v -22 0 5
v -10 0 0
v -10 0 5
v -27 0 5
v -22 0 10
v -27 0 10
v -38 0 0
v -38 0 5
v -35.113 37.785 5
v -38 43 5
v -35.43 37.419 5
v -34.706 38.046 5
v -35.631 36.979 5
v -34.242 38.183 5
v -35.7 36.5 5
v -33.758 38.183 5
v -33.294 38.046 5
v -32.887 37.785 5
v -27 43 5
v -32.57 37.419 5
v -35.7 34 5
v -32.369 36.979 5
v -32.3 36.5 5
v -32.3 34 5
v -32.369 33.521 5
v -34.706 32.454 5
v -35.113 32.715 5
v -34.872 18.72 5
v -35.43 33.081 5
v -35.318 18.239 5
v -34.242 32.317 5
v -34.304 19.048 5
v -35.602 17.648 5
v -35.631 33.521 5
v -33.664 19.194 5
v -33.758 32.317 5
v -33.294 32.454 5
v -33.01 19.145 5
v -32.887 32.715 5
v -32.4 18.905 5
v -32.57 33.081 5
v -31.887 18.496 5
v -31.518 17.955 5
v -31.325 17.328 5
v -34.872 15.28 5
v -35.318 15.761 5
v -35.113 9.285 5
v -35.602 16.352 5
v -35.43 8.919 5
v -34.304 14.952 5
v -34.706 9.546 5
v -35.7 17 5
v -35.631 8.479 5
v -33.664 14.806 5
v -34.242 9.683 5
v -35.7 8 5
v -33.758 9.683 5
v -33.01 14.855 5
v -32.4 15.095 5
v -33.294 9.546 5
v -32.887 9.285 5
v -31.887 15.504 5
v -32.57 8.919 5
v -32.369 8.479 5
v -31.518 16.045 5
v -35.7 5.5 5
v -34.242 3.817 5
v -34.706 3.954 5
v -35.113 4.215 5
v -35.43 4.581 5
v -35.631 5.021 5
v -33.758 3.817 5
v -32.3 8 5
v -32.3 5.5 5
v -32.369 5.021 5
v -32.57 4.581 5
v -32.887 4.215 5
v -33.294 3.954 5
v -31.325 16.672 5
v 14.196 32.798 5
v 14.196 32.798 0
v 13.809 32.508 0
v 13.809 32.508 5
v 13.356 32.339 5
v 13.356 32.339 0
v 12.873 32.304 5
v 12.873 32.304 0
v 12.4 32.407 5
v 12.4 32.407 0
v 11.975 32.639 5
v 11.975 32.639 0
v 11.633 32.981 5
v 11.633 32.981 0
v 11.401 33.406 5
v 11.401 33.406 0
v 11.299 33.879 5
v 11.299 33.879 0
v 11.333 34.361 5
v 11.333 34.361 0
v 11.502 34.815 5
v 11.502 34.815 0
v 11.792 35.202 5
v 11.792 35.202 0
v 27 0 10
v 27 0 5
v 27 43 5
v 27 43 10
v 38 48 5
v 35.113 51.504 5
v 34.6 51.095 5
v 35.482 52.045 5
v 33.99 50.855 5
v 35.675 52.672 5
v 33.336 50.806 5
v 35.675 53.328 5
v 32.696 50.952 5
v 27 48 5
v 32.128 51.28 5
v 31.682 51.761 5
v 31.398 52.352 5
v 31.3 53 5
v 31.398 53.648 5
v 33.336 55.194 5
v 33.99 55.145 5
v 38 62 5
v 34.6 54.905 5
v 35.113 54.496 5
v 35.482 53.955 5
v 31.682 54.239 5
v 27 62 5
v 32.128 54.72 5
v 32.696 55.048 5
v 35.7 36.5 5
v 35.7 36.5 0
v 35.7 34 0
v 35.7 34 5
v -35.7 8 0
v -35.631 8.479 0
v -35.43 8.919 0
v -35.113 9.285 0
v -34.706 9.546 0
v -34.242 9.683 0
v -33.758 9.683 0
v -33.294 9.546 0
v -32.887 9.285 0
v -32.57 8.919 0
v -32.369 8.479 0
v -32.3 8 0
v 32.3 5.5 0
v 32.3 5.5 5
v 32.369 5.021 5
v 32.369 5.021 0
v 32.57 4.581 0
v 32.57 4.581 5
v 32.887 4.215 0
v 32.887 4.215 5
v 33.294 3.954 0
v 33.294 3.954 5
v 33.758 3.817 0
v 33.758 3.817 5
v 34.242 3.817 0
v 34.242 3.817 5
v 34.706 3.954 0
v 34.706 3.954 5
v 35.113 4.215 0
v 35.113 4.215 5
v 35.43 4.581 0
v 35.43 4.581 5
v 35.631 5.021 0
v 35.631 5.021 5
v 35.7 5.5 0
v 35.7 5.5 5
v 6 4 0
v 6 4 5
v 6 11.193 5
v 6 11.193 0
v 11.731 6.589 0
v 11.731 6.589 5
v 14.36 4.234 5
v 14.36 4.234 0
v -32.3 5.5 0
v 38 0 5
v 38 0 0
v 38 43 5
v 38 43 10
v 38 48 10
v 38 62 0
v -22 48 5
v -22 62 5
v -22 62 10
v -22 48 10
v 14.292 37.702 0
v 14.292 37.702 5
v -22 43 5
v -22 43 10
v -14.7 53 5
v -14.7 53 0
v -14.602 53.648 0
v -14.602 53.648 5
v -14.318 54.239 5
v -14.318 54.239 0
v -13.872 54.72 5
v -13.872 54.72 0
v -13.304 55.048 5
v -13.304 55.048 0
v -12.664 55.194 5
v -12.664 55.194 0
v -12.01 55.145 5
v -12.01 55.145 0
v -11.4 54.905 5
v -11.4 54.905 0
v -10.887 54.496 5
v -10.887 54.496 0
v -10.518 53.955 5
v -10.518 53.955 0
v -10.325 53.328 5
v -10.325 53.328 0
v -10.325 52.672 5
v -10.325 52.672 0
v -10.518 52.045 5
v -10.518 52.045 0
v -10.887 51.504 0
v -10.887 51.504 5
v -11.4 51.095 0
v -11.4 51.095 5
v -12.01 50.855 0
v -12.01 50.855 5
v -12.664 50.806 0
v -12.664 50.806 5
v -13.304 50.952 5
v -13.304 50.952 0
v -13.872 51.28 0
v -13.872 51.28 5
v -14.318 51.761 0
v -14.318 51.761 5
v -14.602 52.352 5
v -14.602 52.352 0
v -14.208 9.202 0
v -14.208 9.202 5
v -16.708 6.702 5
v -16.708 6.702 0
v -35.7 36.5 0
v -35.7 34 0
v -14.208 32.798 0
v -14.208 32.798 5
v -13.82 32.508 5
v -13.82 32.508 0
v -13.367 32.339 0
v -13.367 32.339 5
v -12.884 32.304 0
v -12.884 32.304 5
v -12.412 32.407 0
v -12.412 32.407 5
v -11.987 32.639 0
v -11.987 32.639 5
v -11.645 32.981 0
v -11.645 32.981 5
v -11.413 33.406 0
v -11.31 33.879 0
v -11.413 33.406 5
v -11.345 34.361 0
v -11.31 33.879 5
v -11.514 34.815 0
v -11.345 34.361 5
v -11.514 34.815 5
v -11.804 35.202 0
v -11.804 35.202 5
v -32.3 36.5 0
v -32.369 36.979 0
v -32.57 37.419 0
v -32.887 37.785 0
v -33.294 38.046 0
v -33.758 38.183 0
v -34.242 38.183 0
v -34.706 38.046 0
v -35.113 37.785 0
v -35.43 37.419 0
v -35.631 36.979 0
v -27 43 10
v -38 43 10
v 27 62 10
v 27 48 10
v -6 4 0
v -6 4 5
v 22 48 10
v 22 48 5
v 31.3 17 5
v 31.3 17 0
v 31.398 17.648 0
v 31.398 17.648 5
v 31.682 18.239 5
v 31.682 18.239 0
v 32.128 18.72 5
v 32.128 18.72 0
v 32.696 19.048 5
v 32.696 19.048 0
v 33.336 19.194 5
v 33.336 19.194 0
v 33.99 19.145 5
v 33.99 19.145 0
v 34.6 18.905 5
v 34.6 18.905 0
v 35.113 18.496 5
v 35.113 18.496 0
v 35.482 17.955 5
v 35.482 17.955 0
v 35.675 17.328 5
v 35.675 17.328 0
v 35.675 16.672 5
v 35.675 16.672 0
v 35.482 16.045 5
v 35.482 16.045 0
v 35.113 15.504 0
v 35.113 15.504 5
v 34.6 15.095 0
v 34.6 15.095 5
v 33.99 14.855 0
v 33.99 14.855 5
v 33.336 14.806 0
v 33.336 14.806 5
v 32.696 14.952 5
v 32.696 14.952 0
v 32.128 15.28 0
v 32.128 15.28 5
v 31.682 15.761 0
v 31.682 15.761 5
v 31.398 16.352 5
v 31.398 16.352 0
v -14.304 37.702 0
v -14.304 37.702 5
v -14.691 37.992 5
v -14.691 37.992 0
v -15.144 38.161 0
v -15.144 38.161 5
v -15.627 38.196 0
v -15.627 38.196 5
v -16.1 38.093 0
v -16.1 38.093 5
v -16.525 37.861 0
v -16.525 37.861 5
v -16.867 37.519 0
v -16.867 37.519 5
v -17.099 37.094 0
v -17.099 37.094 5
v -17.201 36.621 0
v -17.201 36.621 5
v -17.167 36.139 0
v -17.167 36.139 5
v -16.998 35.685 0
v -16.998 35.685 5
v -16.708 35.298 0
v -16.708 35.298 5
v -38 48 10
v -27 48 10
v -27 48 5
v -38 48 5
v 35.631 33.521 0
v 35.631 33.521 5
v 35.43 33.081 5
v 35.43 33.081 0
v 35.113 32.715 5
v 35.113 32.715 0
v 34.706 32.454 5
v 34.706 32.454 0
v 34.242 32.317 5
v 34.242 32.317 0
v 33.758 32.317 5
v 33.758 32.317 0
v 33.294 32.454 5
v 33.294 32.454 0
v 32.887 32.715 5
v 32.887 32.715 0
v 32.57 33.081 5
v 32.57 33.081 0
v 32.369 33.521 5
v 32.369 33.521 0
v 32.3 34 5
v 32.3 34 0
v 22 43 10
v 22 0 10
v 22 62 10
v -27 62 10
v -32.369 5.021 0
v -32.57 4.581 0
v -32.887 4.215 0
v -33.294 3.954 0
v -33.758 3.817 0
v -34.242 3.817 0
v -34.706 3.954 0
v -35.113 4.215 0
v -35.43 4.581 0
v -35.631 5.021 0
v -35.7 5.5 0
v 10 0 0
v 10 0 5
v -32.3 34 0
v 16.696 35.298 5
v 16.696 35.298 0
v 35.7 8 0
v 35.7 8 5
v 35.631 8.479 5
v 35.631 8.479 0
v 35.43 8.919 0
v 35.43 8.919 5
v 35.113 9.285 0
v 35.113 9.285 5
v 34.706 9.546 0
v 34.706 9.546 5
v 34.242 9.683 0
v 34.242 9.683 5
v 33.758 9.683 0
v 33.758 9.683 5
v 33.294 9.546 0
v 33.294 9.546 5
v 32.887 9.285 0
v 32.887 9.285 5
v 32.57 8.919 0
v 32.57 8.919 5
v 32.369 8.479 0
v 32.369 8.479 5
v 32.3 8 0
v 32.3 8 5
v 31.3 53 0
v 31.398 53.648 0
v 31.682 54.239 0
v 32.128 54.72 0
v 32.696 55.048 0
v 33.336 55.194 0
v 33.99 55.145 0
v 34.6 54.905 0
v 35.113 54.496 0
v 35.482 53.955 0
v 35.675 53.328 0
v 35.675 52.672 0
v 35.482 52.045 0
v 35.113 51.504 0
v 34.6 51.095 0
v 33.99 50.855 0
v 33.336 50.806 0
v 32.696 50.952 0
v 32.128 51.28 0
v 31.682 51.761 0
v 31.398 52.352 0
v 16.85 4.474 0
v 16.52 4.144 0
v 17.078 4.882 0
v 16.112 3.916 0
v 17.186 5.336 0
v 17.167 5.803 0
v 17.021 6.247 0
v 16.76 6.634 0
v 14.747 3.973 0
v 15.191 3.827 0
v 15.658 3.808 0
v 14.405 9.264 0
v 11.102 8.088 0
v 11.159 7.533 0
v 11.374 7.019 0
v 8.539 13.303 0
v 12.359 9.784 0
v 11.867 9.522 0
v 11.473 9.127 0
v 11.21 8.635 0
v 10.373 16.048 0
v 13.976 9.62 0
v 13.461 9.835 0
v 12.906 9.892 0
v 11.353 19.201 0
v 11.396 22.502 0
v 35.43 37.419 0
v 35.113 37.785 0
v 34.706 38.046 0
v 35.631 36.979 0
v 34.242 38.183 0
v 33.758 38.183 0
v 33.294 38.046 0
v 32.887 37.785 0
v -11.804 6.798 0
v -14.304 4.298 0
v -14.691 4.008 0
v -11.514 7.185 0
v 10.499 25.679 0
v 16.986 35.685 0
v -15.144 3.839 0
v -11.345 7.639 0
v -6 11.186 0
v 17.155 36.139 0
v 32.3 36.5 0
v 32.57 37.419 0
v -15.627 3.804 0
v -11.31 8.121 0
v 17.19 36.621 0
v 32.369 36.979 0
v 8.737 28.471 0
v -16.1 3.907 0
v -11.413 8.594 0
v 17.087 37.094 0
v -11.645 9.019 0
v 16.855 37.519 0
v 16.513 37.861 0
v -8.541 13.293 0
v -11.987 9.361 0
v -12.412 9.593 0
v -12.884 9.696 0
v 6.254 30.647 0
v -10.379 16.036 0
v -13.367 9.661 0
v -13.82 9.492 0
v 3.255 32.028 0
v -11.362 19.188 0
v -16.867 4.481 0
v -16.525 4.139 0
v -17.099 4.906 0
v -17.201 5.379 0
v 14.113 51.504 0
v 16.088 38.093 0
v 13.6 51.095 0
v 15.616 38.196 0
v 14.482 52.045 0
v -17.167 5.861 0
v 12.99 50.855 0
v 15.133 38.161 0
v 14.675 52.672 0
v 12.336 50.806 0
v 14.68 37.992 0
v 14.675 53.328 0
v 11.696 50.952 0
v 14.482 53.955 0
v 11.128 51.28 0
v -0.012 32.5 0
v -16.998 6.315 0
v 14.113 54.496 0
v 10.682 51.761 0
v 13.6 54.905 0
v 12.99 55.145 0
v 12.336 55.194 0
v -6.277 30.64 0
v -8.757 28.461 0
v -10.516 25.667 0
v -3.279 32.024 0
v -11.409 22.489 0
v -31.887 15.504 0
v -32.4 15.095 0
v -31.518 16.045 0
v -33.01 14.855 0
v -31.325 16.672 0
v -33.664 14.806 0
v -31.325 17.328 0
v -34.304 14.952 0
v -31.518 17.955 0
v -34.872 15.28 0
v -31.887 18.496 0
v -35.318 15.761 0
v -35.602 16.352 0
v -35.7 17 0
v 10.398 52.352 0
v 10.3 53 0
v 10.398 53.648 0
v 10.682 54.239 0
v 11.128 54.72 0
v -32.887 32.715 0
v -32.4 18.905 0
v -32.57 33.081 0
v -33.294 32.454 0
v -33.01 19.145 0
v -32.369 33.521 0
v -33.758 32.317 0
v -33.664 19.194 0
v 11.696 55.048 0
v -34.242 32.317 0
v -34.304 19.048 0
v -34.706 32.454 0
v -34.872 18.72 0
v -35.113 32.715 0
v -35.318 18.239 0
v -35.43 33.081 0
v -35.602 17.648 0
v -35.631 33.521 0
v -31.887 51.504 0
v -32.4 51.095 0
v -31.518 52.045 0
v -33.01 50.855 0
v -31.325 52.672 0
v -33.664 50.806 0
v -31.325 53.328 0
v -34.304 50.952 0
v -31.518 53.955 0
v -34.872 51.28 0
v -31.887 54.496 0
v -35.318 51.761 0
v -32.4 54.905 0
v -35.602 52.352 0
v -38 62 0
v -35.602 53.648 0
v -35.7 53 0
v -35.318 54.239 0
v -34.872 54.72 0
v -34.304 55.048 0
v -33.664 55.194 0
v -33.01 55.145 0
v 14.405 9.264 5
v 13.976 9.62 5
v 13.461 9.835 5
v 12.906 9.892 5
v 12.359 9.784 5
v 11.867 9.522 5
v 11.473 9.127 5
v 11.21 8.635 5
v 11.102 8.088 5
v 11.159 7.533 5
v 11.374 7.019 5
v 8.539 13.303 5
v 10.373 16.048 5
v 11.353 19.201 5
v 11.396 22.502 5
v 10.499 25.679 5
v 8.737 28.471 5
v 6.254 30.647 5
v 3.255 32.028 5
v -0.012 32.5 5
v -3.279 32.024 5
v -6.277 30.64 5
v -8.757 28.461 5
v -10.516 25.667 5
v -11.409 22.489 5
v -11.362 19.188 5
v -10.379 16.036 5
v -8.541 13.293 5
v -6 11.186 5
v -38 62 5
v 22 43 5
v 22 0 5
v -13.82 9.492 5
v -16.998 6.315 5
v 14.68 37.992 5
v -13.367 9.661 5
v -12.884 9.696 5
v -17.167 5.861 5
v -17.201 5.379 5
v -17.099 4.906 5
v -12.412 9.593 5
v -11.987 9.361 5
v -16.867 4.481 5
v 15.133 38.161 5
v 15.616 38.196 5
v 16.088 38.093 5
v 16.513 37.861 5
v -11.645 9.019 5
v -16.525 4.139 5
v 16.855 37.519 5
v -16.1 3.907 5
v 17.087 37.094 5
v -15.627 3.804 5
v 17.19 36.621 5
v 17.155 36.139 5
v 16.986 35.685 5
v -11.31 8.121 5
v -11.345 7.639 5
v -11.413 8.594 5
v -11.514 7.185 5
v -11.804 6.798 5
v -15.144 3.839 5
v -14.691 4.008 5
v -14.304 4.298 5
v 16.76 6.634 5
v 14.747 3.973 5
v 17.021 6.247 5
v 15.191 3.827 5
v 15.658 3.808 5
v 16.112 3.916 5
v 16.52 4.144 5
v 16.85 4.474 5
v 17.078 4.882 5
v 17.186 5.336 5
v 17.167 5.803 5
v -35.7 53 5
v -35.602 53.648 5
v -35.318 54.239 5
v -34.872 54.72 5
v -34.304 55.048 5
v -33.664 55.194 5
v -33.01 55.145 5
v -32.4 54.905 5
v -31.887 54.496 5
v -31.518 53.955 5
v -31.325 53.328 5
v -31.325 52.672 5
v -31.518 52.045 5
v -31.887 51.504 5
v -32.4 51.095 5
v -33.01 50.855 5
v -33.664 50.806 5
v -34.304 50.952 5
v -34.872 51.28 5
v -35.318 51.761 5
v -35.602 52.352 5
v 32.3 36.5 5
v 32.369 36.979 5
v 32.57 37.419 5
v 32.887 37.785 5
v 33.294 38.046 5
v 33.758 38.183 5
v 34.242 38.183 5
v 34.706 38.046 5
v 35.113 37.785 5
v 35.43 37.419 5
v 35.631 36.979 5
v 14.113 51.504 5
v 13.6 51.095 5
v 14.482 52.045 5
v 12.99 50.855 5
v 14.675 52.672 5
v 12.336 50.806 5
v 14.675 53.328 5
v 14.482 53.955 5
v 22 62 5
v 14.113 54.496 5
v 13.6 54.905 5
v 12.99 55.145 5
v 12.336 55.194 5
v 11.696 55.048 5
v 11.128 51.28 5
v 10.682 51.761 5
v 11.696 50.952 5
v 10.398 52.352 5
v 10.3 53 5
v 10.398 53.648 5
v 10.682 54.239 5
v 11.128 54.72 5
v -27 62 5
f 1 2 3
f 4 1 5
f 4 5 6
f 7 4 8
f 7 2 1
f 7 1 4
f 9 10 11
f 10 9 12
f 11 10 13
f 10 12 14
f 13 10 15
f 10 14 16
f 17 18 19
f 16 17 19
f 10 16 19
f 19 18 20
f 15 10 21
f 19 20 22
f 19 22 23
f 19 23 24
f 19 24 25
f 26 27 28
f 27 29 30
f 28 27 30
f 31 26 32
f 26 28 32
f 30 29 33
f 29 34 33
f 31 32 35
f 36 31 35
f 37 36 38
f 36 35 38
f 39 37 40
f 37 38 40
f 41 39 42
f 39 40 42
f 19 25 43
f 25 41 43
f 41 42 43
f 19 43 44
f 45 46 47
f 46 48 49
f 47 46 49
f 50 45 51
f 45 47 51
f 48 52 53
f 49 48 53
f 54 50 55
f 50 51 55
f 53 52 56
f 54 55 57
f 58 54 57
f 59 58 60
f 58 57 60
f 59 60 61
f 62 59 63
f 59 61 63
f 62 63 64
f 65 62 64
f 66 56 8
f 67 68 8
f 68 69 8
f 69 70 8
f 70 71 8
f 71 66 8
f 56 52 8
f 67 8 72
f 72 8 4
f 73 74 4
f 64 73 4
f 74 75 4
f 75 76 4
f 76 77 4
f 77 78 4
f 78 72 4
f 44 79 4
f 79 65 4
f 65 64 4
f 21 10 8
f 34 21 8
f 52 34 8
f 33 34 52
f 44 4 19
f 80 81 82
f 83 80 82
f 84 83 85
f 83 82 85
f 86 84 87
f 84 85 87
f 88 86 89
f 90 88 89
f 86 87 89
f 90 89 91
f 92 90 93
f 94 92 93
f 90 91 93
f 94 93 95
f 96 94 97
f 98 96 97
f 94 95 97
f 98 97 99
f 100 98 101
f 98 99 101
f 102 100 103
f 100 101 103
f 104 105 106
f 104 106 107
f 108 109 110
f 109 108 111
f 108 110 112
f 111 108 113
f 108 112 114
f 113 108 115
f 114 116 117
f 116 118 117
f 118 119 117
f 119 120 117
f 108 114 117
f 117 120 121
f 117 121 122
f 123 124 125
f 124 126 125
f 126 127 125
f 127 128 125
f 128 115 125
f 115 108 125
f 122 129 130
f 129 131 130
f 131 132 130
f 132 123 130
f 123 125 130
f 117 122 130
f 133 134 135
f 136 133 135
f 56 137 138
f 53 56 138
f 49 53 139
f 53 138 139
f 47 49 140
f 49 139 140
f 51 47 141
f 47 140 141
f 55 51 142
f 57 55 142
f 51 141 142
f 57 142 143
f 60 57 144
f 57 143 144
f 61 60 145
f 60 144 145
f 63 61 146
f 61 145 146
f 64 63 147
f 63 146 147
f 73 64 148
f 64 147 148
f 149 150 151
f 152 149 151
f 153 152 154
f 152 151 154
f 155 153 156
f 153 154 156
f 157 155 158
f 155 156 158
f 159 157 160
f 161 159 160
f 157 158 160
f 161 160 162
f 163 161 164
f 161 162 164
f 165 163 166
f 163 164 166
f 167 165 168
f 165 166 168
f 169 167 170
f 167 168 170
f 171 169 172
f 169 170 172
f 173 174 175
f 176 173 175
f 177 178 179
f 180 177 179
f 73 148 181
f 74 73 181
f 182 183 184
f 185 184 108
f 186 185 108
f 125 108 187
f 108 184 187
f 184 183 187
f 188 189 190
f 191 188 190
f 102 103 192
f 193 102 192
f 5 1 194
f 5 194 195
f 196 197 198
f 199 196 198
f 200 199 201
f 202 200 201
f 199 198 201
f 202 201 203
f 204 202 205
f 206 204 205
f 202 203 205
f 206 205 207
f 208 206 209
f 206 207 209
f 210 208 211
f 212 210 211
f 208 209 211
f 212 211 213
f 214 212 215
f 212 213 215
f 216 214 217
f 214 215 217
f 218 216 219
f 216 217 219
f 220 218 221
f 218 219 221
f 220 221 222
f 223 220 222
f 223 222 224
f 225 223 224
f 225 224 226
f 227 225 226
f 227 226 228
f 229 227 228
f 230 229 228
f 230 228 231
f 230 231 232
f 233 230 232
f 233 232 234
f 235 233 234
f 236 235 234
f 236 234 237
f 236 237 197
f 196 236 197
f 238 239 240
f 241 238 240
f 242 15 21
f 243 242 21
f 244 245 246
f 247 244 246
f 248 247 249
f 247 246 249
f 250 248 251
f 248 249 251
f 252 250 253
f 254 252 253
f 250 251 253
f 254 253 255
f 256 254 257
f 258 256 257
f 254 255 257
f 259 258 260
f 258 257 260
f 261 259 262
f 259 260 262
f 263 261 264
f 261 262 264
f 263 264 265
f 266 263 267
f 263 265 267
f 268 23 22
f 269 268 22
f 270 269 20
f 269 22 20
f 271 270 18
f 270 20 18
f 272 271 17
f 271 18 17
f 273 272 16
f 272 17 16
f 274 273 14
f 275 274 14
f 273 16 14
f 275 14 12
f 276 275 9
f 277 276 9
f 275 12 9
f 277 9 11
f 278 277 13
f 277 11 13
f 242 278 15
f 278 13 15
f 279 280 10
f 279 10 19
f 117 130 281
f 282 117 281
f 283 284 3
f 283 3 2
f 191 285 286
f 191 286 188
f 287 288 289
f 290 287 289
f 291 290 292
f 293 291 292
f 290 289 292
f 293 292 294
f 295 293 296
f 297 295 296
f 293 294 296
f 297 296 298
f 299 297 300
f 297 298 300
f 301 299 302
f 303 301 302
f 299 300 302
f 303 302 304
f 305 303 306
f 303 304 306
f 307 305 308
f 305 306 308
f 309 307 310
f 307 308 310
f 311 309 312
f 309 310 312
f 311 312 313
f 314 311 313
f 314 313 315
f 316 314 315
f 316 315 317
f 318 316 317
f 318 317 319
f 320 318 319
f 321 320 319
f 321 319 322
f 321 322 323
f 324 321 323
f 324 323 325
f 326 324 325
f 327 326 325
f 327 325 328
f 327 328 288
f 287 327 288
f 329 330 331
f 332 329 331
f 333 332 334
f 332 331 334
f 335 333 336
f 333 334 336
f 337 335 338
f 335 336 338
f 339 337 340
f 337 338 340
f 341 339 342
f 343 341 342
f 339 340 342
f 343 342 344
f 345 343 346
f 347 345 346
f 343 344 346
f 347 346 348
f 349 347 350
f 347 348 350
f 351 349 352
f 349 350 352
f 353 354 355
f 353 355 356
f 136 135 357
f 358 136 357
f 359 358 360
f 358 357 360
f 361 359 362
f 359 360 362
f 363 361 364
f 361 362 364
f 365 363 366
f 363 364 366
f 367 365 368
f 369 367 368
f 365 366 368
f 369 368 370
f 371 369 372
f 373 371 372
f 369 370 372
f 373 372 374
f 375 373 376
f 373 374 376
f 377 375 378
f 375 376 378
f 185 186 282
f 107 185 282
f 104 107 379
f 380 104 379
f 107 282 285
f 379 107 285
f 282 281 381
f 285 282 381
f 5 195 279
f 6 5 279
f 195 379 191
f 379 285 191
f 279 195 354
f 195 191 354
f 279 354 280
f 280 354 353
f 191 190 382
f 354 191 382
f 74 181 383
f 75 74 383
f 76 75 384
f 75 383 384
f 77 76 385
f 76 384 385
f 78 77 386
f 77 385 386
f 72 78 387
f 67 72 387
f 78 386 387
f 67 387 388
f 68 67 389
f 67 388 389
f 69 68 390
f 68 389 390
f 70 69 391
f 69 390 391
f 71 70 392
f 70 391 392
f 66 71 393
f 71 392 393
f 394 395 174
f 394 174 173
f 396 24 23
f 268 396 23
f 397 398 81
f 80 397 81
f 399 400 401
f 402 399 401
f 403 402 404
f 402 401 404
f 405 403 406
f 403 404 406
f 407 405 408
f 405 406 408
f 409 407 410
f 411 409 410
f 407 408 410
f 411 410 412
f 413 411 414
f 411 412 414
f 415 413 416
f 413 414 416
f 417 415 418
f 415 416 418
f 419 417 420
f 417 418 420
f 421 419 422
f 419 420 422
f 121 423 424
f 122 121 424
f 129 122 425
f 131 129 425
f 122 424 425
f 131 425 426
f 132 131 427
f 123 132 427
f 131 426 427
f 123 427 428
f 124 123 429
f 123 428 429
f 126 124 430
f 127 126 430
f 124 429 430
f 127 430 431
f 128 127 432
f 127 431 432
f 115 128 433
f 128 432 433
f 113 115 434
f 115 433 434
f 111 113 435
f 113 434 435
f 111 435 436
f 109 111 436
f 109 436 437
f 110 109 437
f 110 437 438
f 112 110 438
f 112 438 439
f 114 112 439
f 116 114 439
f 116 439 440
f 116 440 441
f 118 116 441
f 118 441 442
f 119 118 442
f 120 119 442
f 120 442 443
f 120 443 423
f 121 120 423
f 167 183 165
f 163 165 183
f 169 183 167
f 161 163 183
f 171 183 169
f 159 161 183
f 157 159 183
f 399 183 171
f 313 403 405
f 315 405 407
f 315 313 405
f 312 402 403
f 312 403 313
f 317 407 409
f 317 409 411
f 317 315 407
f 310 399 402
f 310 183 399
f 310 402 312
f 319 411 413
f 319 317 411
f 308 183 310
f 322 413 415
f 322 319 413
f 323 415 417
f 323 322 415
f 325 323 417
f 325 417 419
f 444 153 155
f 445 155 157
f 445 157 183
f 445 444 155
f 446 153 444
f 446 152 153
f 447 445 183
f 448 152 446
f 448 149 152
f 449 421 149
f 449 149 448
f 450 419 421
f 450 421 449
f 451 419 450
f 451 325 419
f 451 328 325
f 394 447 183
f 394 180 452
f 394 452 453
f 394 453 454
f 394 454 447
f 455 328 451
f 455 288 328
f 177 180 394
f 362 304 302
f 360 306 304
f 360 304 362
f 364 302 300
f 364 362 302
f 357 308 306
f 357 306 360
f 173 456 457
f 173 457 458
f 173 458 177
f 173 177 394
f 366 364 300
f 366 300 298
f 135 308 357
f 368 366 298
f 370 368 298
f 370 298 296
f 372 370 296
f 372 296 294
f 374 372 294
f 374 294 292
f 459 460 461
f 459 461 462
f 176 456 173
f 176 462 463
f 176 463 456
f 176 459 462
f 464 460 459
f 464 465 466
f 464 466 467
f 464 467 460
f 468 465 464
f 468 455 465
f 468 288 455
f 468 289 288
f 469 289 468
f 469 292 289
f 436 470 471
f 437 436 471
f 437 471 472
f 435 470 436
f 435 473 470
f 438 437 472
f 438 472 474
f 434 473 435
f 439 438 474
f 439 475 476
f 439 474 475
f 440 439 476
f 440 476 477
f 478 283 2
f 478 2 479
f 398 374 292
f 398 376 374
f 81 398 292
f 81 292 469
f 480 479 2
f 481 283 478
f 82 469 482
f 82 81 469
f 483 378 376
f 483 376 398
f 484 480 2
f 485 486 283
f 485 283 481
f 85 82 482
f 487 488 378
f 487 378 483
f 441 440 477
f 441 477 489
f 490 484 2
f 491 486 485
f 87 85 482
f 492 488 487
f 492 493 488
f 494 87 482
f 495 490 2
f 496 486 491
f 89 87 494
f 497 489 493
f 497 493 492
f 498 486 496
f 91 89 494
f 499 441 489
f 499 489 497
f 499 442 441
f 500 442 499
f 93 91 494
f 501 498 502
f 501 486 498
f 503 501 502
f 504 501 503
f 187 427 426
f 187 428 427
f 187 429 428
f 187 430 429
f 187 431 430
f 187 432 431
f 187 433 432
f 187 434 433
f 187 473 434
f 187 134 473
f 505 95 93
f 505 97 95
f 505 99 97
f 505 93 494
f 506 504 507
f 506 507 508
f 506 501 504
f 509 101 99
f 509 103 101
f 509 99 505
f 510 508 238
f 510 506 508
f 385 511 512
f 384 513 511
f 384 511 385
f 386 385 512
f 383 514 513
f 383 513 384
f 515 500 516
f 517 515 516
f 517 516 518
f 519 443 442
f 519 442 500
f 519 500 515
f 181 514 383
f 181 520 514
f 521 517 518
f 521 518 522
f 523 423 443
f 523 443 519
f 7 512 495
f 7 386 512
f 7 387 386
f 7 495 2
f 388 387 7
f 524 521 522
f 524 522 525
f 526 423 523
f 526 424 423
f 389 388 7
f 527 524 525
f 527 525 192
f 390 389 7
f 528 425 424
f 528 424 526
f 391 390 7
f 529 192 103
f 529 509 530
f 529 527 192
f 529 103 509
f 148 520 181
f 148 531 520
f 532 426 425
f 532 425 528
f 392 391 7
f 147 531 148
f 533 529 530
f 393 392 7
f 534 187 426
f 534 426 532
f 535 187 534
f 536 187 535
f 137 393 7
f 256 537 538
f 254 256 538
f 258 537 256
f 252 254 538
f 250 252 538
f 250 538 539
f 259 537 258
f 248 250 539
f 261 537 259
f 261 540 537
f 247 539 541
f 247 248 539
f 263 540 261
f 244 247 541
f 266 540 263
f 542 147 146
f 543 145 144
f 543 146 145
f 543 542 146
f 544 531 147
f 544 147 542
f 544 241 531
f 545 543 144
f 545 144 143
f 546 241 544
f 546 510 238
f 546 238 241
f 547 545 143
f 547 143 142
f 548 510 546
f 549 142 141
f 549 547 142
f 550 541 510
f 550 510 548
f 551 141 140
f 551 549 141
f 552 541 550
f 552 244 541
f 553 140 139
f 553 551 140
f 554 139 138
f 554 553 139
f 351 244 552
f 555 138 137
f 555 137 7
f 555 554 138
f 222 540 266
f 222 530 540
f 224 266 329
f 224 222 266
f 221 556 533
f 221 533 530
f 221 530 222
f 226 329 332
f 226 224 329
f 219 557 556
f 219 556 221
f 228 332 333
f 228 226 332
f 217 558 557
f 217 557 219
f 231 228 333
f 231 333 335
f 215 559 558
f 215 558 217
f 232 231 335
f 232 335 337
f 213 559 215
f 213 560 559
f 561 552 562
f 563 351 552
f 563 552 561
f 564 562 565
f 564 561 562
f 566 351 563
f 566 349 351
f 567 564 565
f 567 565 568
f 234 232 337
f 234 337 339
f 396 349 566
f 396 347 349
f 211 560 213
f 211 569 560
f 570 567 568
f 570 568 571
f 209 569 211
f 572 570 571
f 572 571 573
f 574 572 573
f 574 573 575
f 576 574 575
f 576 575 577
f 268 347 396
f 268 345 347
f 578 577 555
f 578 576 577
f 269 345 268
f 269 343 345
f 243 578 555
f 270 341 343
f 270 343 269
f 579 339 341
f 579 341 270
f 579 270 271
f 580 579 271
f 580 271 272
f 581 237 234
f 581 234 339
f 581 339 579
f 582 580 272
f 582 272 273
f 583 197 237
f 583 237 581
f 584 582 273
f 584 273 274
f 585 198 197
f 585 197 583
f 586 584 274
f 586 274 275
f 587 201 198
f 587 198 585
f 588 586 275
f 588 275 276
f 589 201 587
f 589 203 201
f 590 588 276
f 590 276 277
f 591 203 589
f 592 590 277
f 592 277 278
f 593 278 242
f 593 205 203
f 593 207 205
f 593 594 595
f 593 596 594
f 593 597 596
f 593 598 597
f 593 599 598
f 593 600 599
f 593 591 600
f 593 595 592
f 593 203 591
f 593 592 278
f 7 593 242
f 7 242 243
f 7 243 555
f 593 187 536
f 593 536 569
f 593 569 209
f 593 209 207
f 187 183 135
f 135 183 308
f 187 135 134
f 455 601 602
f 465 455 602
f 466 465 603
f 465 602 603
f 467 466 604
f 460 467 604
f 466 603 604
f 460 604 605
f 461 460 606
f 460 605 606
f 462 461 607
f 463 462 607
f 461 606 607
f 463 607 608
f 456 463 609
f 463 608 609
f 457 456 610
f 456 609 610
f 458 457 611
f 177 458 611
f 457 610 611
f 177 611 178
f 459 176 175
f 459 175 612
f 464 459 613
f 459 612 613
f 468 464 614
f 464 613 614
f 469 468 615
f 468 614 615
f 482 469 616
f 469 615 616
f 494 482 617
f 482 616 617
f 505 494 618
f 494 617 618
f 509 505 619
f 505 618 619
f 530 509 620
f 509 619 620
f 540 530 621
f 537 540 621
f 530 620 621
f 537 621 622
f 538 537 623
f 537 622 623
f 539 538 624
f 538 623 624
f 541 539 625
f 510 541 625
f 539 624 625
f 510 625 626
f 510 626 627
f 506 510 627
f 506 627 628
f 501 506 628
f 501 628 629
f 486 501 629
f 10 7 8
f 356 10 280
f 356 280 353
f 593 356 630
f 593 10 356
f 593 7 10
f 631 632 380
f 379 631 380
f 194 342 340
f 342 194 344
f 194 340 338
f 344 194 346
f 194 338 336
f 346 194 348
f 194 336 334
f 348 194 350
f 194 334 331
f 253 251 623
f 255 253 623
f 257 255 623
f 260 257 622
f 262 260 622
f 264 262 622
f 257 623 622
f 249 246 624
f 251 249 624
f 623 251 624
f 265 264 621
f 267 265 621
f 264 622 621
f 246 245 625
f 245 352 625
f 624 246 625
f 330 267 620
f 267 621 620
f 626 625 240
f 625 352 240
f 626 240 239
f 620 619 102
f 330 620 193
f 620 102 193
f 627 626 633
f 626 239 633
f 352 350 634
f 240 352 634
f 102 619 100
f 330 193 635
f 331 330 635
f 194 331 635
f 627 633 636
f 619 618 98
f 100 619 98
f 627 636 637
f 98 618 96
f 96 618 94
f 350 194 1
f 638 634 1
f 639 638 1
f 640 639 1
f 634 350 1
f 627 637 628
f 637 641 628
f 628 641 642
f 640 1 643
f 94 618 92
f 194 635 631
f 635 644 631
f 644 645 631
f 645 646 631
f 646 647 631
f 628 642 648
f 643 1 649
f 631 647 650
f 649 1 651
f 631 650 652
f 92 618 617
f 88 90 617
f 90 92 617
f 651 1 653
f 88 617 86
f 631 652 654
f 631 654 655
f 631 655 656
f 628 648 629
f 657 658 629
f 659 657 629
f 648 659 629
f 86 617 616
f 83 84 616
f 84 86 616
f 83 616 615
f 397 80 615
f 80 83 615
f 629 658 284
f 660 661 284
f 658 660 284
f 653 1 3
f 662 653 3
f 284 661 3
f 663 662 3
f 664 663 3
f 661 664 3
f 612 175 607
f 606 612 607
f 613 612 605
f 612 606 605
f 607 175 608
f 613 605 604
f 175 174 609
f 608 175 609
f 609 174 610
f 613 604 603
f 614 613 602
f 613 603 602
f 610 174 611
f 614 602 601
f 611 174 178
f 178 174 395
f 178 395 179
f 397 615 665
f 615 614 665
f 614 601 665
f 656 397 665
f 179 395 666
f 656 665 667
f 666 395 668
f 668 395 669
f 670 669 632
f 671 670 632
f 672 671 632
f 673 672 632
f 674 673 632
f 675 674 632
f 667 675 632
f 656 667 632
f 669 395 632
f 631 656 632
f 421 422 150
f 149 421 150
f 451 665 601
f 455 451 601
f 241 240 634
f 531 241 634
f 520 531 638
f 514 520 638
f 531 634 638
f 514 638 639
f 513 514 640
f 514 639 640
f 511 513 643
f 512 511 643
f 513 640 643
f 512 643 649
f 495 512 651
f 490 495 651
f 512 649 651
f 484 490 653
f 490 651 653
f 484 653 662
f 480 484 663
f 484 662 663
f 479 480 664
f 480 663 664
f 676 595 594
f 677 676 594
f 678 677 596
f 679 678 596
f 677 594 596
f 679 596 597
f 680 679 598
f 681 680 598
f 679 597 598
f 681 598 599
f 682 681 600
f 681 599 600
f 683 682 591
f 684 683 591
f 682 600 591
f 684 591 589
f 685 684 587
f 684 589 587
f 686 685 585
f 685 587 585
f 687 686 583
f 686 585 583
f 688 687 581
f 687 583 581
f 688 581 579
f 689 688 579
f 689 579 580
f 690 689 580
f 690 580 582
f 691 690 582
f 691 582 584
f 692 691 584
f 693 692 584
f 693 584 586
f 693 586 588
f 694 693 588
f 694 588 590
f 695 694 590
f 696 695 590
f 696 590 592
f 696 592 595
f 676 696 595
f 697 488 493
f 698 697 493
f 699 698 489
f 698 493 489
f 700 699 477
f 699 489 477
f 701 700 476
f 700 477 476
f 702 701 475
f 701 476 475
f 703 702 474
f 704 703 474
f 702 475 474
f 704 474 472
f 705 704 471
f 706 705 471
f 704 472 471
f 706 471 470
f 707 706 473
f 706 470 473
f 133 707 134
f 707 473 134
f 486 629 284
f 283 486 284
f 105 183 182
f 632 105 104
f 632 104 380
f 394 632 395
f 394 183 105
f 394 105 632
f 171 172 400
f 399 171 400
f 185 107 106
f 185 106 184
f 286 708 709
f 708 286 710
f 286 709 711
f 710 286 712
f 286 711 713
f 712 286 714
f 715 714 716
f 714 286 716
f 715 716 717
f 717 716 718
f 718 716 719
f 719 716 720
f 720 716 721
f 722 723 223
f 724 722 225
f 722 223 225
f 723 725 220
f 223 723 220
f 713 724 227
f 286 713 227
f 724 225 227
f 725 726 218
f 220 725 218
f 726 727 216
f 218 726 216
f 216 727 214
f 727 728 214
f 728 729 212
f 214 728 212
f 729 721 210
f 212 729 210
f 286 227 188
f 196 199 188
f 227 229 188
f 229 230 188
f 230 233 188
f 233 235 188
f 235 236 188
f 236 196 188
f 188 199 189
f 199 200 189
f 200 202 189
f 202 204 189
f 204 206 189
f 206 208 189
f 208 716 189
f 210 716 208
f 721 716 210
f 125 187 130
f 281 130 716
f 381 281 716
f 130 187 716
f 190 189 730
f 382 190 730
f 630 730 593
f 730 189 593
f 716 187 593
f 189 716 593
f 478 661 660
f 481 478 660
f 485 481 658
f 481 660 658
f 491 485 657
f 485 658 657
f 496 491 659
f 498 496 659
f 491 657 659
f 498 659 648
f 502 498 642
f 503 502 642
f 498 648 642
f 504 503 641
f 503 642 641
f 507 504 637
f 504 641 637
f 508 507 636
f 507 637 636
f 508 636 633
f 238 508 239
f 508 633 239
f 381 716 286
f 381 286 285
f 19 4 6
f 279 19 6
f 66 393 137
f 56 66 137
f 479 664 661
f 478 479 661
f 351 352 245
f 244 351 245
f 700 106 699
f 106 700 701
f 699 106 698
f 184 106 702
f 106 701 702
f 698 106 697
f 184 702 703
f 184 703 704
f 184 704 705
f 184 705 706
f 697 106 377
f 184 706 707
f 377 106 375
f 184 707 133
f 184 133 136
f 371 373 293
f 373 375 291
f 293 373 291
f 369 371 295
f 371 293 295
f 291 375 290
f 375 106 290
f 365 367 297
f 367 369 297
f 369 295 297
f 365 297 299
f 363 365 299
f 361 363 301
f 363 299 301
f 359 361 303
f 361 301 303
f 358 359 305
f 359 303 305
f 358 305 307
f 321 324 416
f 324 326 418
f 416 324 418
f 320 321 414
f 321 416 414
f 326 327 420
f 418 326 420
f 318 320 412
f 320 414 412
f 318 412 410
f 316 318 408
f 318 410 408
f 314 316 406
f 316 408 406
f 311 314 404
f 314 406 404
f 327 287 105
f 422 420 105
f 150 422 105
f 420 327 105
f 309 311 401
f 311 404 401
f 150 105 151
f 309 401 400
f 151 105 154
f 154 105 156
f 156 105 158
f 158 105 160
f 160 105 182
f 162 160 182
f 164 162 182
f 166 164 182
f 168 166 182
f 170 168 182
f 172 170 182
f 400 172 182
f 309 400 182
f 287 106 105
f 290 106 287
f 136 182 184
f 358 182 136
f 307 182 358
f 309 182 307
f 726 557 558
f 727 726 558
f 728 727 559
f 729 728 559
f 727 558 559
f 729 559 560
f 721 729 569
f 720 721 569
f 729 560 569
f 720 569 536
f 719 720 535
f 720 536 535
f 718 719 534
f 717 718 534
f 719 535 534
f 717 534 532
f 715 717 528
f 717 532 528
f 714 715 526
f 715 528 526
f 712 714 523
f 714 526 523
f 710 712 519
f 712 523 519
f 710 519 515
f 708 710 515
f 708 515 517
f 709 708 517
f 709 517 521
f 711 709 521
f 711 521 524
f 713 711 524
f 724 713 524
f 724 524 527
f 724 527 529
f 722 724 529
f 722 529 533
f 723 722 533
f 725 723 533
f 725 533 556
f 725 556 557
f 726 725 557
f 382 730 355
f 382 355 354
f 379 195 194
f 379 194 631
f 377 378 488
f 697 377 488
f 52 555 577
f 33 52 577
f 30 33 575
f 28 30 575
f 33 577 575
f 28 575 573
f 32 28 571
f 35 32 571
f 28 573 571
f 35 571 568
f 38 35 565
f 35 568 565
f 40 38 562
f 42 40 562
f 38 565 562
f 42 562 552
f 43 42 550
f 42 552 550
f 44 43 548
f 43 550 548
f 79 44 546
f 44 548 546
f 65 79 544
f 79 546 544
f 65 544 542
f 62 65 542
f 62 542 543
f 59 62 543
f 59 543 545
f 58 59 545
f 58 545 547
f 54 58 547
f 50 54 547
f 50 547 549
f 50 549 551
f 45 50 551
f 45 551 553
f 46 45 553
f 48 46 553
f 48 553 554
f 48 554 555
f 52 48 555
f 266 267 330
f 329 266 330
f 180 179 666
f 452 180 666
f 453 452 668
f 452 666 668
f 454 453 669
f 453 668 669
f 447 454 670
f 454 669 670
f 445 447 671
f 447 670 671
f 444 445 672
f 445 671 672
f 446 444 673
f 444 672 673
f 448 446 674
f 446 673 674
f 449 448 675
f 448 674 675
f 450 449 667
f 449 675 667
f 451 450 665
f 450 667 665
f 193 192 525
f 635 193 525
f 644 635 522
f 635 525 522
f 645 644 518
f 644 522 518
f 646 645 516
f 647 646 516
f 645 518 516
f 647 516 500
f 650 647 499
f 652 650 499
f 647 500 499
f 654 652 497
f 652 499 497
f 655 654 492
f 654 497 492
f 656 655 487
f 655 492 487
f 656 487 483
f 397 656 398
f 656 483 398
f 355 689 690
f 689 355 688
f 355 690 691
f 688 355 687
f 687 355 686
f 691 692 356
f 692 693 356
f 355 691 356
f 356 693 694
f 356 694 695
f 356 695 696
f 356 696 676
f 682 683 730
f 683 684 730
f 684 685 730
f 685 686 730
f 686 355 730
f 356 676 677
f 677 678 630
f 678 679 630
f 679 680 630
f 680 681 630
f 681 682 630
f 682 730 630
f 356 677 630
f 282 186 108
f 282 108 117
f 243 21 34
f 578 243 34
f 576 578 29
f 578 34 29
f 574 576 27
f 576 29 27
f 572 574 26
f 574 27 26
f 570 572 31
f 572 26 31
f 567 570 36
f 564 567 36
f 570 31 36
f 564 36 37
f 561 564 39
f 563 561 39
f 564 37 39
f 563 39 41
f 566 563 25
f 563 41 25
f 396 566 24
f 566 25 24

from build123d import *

# Parameters (mm, degrees)
SKETCH1_W           = 76
SKETCH1_H           = 62
BOSS_EXTRUDE1_DEPTH = 10
SKETCH2_W           = 44
SKETCH2_H           = 5
CUT_EXTRUDE1_DEPTH  = 43
CUT_EXTRUDE2_DEPTH  = 73.890328577
CUT_EXTRUDE3_DEPTH  = 73.890328577
CUT_EXTRUDE4_DEPTH  = 73.890328577
CUT_EXTRUDE5_DEPTH  = 73.890328577
CUT_EXTRUDE6_DEPTH  = 74.402997214
SKETCH8_W           = 11
SKETCH8_H           = 5
CUT_EXTRUDE7_DEPTH  = 43
CUT_EXTRUDE8_DEPTH  = 74.402997214
SKETCH10_W          = 11
SKETCH10_H          = 5
CUT_EXTRUDE9_DEPTH  = 43
CUT_EXTRUDE10_DEPTH = 73.890328577
CUT_EXTRUDE11_DEPTH = 74.402997214
CUT_EXTRUDE12_DEPTH = 73.890328577
SKETCH14_W          = 11
SKETCH14_H          = 5
CUT_EXTRUDE13_DEPTH = 14
SKETCH15_W          = 11
SKETCH15_H          = 5
CUT_EXTRUDE14_DEPTH = 14
SKETCH16_W          = 44
SKETCH16_H          = 5
CUT_EXTRUDE15_DEPTH = 14
SKETCH17_W          = 11.5
SKETCH17_H          = 5
HOLE1_D             = 4.4
HOLE2_D             = 4.4
HOLE3_D             = 4.4
HOLE4_D             = 4.4
HOLE5_D             = 4.4
HOLE6_D             = 4.4
CHAMFER1_SIZE       = 4
CHAMFER2_SIZE       = 4


with BuildPart() as part:
    # Sketch1 → Boss-Extrude1 (new body)
    with BuildSketch(Plane(origin=(0, 0, 0), x_dir=(-1, 0, 0), z_dir=(0, 0, -1))):
        with Locations((0, 31)):
            Rectangle(SKETCH1_W, SKETCH1_H)
    extrude(amount=-BOSS_EXTRUDE1_DEPTH)

    # Sketch2 → Cut-Extrude1 (cut)
    with BuildSketch(Plane.XZ):
        with Locations((0, 7.5)):
            Rectangle(SKETCH2_W, SKETCH2_H)
    extrude(amount=-CUT_EXTRUDE1_DEPTH, mode=Mode.SUBTRACT)

    # Sketch3 → Cut-Extrude2 (cut, through all)
    with BuildSketch(Plane.XY.offset(5)):
        with BuildLine():
            Line((-6, 0), (6, 0))
            Line((6, 0), (6, 11.192803568))
            ThreePointArc((6, 11.192803568), (0.00098815, 9.500001967), (-6, 11.185784174))
            Line((-6, 11.185784174), (-6, 0))
        make_face()
    extrude(amount=-CUT_EXTRUDE2_DEPTH, mode=Mode.SUBTRACT)

    # Sketch4 → Cut-Extrude3 (cut, through all)
    with BuildSketch(Plane.XY.offset(5)):
        with BuildLine():
            Line((-11.803657239, 35.202081528), (-14.303657239, 37.702081528))
            ThreePointArc((-14.303657239, 37.702081528), (-16.707820295, 37.702081528), (-16.707820295, 35.297918472))
            Line((-16.707820295, 35.297918472), (-14.207820295, 32.797918472))
            ThreePointArc((-14.207820295, 32.797918472), (-11.803657239, 32.797918472), (-11.803657239, 35.202081528))
        make_face()
    extrude(amount=-CUT_EXTRUDE3_DEPTH, mode=Mode.SUBTRACT)

    # Sketch5 → Cut-Extrude4 (cut, through all)
    with BuildSketch(Plane.XY.offset(5)):
        with BuildLine():
            Line((-14.207820295, 9.202081528), (-16.707820295, 6.702081528))
            ThreePointArc((-16.707820295, 6.702081528), (-16.707820295, 4.297918472), (-14.303657239, 4.297918472))
            Line((-14.303657239, 4.297918472), (-11.803657239, 6.797918472))
            ThreePointArc((-11.803657239, 6.797918472), (-11.803657239, 9.202081528), (-14.207820295, 9.202081528))
        make_face()
    extrude(amount=-CUT_EXTRUDE4_DEPTH, mode=Mode.SUBTRACT)

    # Sketch6 → Cut-Extrude5 (cut, through all)
    with BuildSketch(Plane.XY.offset(5)):
        with BuildLine():
            Line((11.730546448, 6.589437375), (14.359896375, 4.233818192))
            ThreePointArc((14.359896375, 4.233818192), (16.696342761, 4.297918472), (16.760443041, 6.634364857))
            Line((16.760443041, 6.634364857), (14.404823858, 9.263714785))
            ThreePointArc((14.404823858, 9.263714785), (11.655108147, 9.339153086), (11.730546448, 6.589437375))
        make_face()
    extrude(amount=-CUT_EXTRUDE5_DEPTH, mode=Mode.SUBTRACT)

    # Sketch7 → Cut-Extrude6 (cut, through all)
    with BuildSketch(Plane(origin=(0, 0, 0), x_dir=(-1, 0, 0), z_dir=(0, 0, -1))):
        with BuildLine():
            Line((-16.696342761, 35.297918472), (-14.196342761, 32.797918472))
            ThreePointArc((-14.196342761, 32.797918472), (-11.792179705, 32.797918472), (-11.792179705, 35.202081528))
            Line((-11.792179705, 35.202081528), (-14.292179705, 37.702081528))
            ThreePointArc((-14.292179705, 37.702081528), (-16.696342761, 37.702081528), (-16.696342761, 35.297918472))
        make_face()
    extrude(amount=-CUT_EXTRUDE6_DEPTH, mode=Mode.SUBTRACT)

    # Sketch8 → Cut-Extrude7 (cut)
    with BuildSketch(Plane.XZ):
        with Locations((32.5, 7.5)):
            Rectangle(SKETCH8_W, SKETCH8_H)
    extrude(amount=-CUT_EXTRUDE7_DEPTH, mode=Mode.SUBTRACT)

    # Sketch9 → Cut-Extrude8 (cut, through all)
    with BuildSketch(Plane(origin=(0, 0, 0), x_dir=(-1, 0, 0), z_dir=(0, 0, -1))):
        with BuildLine():
            Line((-32.3, 34), (-32.3, 36.5))
            ThreePointArc((-32.3, 36.5), (-34, 38.2), (-35.7, 36.5))
            Line((-35.7, 36.5), (-35.7, 34))
            ThreePointArc((-35.7, 34), (-34, 32.3), (-32.3, 34))
        make_face()
    extrude(amount=-CUT_EXTRUDE8_DEPTH, mode=Mode.SUBTRACT)

    # Sketch10 → Cut-Extrude9 (cut)
    with BuildSketch(Plane.XZ):
        with Locations((-32.5, 7.5)):
            Rectangle(SKETCH10_W, SKETCH10_H)
    extrude(amount=-CUT_EXTRUDE9_DEPTH, mode=Mode.SUBTRACT)

    # Sketch11 → Cut-Extrude10 (cut, through all)
    with BuildSketch(Plane.XY.offset(5)):
        with BuildLine():
            Line((-35.7, 36.5), (-35.7, 34))
            ThreePointArc((-35.7, 34), (-34, 32.3), (-32.3, 34))
            Line((-32.3, 34), (-32.3, 36.5))
            ThreePointArc((-32.3, 36.5), (-34, 38.2), (-35.7, 36.5))
        make_face()
    extrude(amount=-CUT_EXTRUDE10_DEPTH, mode=Mode.SUBTRACT)

    # Sketch12 → Cut-Extrude11 (cut, through all)
    with BuildSketch(Plane(origin=(0, 0, 0), x_dir=(-1, 0, 0), z_dir=(0, 0, -1))):
        with BuildLine():
            Line((32.3, 8), (32.3, 5.5))
            ThreePointArc((32.3, 5.5), (34, 3.8), (35.7, 5.5))
            Line((35.7, 5.5), (35.7, 8))
            ThreePointArc((35.7, 8), (34, 9.7), (32.3, 8))
        make_face()
    extrude(amount=-CUT_EXTRUDE11_DEPTH, mode=Mode.SUBTRACT)

    # Sketch13 → Cut-Extrude12 (cut, through all)
    with BuildSketch(Plane.XY.offset(5)):
        with BuildLine():
            Line((35.7, 5.5), (35.7, 8))
            ThreePointArc((35.7, 8), (34, 9.7), (32.3, 8))
            Line((32.3, 8), (32.3, 5.5))
            ThreePointArc((32.3, 5.5), (34, 3.8), (35.7, 5.5))
        make_face()
    extrude(amount=-CUT_EXTRUDE12_DEPTH, mode=Mode.SUBTRACT)

    # Sketch14 → Cut-Extrude13 (cut)
    with BuildSketch(Plane(origin=(0, 62, 0), x_dir=(-1, 0, 0), z_dir=(0, 1, 0))):
        with Locations((-32.5, 7.5)):
            Rectangle(SKETCH14_W, SKETCH14_H)
    extrude(amount=-CUT_EXTRUDE13_DEPTH, mode=Mode.SUBTRACT)

    # Sketch15 → Cut-Extrude14 (cut)
    with BuildSketch(Plane(origin=(0, 62, 0), x_dir=(-1, 0, 0), z_dir=(0, 1, 0))):
        with Locations((32.5, 7.5)):
            Rectangle(SKETCH15_W, SKETCH15_H)
    extrude(amount=-CUT_EXTRUDE14_DEPTH, mode=Mode.SUBTRACT)

    # Sketch16 → Cut-Extrude15 (cut)
    with BuildSketch(Plane(origin=(0, 62, 0), x_dir=(-1, 0, 0), z_dir=(0, 1, 0))):
        with Locations((0, 7.5)):
            Rectangle(SKETCH16_W, SKETCH16_H)
    extrude(amount=-CUT_EXTRUDE15_DEPTH, mode=Mode.SUBTRACT)

    # Sketch17 → Cut-Revolve1 (revolve, cut)
    with BuildSketch(Plane(origin=(0, 21, 0), x_dir=(-1, 0, 0), z_dir=(0, 1, 0))):
        with Locations((-5.744261233, 2.5)):
            Rectangle(SKETCH17_W, SKETCH17_H)
    revolve(axis=Axis((-0.005738767, 21, 0), (0, 0, 1)), mode=Mode.SUBTRACT)

    # Hole1 (through all)
    with Locations(Plane.XY.offset(5)):
        with Locations((-33.5, 17)):
            Hole(HOLE1_D / 2)

    # Hole2 (through all)
    with Locations(Plane.XY.offset(5)):
        with Locations((33.5, 17)):
            Hole(HOLE2_D / 2)

    # Hole3 (through all)
    with Locations(Plane.XY.offset(5)):
        with Locations((33.5, 53)):
            Hole(HOLE3_D / 2)

    # Hole4 (through all)
    with Locations(Plane.XY.offset(5)):
        with Locations((-33.5, 53)):
            Hole(HOLE4_D / 2)

    # Hole5 (through all)
    with Locations(Plane.XY.offset(5)):
        with Locations((-12.5, 53)):
            Hole(HOLE5_D / 2)

    # Hole6 (through all)
    with Locations(Plane.XY.offset(5)):
        with Locations((12.5, 53)):
            Hole(HOLE6_D / 2)

    # Chamfer1
    chamfer1_edges = [part.edges().sort_by_distance(p)[0] for p in [
        (-6, 0, 2.5),
    ]]
    chamfer(chamfer1_edges, length=CHAMFER1_SIZE)

    # Chamfer2
    chamfer2_edges = [part.edges().sort_by_distance(p)[0] for p in [
        (6, 0, 2.5),
    ]]
    chamfer(chamfer2_edges, length=CHAMFER2_SIZE)


solid = part.part
